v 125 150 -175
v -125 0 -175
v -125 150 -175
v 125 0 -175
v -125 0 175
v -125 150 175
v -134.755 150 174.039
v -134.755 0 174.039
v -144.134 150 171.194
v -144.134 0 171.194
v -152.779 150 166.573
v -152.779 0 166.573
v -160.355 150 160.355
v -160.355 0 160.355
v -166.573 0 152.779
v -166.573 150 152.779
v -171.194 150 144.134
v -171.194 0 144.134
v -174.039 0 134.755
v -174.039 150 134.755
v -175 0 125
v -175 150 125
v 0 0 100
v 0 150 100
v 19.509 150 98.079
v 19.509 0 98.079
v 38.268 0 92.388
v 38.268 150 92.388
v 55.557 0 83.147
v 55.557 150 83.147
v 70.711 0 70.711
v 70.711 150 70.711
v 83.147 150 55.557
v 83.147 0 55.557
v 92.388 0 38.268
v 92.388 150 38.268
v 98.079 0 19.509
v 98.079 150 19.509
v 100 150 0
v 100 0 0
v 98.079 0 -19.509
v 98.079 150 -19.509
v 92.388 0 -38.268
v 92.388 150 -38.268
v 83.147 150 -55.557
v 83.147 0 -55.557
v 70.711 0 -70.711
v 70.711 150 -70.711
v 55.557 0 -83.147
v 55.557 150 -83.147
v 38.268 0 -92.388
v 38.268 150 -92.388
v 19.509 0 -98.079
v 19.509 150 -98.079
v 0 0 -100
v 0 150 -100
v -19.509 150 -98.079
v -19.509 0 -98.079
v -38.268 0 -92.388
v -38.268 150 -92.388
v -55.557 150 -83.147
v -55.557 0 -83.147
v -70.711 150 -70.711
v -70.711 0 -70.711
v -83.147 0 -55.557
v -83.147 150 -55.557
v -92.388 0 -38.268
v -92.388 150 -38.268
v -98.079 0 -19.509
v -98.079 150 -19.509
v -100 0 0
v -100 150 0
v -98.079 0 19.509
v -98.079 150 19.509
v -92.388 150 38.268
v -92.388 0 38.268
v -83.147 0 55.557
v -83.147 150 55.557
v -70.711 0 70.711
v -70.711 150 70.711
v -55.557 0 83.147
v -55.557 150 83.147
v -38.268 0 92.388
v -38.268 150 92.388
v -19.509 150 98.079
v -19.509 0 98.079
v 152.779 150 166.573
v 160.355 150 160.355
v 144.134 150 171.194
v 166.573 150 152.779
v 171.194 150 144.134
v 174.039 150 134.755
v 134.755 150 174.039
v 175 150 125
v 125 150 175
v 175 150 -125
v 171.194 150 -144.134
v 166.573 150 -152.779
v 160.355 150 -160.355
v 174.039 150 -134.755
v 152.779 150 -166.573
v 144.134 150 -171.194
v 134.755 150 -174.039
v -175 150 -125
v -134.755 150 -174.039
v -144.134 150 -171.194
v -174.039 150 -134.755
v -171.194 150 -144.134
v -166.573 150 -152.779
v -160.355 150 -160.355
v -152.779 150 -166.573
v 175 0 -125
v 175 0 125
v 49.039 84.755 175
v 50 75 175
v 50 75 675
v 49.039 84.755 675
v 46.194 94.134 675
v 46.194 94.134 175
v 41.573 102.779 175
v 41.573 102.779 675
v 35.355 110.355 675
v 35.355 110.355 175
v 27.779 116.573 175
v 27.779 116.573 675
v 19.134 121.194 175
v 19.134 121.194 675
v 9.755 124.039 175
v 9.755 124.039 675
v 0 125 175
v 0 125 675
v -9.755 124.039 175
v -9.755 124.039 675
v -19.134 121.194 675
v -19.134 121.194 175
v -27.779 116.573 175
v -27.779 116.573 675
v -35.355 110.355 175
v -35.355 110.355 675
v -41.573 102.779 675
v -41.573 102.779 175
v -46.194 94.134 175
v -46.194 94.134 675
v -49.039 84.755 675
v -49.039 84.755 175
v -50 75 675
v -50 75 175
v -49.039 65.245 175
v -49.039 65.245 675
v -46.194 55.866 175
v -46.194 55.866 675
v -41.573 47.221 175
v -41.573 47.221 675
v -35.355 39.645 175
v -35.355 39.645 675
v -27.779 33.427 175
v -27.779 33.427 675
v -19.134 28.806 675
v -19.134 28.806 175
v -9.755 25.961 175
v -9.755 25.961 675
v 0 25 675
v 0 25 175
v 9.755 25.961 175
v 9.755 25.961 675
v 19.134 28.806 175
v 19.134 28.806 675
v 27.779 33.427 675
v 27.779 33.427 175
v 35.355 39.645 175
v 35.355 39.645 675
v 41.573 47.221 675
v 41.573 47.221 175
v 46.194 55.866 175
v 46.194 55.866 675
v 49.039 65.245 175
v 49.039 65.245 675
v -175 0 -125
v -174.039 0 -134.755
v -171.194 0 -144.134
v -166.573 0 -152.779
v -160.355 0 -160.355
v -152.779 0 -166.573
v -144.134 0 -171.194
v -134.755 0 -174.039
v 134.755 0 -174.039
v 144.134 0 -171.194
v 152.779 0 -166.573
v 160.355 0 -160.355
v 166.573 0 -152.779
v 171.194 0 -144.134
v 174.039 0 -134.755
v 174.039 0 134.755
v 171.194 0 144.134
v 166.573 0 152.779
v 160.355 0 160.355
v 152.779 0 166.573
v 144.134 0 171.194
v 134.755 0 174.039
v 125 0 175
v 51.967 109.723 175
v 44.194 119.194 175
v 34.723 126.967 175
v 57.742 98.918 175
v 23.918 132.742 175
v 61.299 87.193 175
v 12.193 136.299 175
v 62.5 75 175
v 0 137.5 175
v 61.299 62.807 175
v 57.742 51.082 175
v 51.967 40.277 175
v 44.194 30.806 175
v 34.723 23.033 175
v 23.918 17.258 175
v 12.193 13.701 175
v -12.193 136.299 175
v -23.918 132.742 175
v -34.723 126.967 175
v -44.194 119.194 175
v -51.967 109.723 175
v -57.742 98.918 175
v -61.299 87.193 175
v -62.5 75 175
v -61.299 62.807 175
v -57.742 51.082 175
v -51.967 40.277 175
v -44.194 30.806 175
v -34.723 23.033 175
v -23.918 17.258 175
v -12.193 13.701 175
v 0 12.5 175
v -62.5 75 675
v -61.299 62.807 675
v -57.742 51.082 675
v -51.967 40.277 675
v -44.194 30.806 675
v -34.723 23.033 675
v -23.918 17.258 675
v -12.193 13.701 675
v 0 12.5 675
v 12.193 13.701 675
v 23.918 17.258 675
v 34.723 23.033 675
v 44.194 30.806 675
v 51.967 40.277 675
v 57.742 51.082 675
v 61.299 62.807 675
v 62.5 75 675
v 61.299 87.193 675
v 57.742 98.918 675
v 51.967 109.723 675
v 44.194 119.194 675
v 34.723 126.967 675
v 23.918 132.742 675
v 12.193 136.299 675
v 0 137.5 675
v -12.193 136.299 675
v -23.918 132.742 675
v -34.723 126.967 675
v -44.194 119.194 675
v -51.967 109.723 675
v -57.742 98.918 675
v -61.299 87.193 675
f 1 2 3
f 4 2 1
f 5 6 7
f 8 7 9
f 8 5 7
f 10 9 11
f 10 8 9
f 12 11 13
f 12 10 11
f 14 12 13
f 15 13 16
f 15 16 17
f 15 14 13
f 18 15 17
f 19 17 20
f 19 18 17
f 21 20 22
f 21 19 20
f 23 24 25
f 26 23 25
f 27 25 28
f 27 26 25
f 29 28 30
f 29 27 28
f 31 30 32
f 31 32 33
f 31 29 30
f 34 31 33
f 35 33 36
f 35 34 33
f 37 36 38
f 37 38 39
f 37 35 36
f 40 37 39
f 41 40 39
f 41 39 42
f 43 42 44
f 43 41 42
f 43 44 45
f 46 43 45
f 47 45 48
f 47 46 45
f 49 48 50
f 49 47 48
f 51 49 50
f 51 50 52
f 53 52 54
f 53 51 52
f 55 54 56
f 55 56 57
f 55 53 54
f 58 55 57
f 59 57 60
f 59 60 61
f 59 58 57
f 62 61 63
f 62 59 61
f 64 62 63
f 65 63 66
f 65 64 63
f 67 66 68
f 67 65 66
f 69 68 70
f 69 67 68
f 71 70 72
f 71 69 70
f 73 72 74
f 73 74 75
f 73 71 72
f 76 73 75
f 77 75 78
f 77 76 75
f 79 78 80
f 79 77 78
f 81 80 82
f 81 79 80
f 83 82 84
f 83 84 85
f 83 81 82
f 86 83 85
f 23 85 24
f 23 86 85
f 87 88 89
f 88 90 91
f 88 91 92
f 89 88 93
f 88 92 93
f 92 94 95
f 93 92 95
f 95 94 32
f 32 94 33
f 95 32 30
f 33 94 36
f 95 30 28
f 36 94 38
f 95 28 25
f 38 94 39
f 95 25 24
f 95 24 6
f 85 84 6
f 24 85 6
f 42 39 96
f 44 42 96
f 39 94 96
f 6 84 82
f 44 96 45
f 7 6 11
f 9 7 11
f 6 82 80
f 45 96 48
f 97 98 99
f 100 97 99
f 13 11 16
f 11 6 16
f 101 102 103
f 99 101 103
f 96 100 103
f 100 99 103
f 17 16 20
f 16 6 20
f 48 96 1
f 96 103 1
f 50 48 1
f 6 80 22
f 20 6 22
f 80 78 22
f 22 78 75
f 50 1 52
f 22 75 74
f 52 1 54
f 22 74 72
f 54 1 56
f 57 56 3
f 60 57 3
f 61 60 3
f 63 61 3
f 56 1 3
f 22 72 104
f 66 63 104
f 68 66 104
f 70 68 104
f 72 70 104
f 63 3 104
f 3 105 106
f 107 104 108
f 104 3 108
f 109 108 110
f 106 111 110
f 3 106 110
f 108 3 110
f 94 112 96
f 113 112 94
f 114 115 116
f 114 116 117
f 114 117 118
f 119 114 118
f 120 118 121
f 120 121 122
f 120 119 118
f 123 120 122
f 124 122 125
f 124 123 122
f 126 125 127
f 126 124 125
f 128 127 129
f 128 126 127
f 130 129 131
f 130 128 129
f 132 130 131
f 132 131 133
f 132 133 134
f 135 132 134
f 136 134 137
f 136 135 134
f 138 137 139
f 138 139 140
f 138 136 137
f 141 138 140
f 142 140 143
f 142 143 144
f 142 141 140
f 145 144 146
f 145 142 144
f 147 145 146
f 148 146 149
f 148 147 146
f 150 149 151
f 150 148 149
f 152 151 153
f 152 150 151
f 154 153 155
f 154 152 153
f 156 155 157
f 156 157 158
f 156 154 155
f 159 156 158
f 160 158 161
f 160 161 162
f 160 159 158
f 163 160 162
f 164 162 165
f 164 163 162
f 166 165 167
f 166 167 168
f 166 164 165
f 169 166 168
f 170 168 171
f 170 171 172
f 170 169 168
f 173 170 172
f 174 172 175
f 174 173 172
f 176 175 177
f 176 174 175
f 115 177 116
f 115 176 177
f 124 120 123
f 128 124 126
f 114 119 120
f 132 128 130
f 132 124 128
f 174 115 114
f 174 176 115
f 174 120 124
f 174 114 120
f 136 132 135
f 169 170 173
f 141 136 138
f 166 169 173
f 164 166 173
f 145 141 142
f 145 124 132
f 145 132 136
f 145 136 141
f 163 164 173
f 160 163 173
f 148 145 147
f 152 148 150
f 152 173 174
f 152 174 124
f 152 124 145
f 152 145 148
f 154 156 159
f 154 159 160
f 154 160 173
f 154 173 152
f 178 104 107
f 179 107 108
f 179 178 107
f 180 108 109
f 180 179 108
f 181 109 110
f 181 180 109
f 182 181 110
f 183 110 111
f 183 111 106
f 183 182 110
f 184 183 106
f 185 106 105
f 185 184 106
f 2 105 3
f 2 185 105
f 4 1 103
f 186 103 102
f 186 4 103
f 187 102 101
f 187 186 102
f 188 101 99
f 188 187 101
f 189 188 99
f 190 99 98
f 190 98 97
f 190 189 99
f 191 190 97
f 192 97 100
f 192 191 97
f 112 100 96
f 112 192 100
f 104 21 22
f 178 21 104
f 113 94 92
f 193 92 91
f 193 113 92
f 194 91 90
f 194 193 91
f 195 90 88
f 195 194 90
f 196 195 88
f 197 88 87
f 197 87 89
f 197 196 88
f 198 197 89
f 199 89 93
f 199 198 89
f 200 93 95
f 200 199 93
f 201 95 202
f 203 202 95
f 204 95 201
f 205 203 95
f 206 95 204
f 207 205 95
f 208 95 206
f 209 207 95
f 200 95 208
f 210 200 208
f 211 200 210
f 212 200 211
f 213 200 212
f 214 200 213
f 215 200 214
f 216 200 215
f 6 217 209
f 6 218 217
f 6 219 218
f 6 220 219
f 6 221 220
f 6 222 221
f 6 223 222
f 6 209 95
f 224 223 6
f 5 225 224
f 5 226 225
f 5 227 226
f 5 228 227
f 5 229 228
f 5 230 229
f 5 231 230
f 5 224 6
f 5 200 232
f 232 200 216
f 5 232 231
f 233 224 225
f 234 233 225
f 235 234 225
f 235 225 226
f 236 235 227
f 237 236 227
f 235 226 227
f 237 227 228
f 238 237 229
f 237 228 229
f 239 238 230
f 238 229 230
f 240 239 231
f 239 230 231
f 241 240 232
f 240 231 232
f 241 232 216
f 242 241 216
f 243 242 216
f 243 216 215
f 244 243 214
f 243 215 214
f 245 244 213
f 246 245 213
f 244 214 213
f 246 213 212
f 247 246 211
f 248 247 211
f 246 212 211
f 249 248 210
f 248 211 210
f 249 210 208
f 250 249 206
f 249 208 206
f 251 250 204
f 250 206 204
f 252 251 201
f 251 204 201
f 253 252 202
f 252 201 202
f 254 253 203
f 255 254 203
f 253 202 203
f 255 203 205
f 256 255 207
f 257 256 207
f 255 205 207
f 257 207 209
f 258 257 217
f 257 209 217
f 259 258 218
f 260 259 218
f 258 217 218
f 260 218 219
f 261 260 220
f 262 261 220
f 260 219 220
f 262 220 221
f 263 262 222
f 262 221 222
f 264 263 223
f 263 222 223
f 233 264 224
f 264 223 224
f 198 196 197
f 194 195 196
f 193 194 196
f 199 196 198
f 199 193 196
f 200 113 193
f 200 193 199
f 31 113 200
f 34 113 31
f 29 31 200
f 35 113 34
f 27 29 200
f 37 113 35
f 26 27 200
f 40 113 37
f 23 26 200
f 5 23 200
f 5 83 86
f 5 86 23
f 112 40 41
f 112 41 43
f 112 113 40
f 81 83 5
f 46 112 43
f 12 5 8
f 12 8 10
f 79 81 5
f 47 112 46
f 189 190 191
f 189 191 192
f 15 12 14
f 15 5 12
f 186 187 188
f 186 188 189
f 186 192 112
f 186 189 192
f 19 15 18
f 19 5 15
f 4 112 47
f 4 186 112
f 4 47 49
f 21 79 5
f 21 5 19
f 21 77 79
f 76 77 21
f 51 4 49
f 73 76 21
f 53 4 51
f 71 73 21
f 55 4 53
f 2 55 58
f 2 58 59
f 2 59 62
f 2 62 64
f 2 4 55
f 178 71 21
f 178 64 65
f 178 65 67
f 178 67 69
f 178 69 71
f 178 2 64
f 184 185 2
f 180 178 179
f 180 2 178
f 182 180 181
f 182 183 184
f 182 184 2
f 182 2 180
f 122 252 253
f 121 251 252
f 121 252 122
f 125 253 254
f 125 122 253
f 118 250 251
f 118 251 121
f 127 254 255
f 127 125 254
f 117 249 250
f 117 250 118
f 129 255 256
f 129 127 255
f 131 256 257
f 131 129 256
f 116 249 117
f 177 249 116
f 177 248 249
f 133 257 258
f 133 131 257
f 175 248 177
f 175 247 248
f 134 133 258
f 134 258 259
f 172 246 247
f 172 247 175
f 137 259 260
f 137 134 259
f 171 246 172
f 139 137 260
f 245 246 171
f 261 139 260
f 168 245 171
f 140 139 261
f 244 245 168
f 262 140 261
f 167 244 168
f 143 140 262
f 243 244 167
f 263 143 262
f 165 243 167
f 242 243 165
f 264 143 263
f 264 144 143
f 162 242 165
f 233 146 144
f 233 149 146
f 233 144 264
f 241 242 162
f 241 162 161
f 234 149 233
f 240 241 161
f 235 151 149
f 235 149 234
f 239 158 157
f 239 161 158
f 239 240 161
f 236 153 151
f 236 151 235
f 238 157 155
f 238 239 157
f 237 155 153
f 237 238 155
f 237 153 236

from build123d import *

# Parameters (mm, degrees)
SKETCH1_R           = 100
BOSS_EXTRUDE1_DEPTH = 150
SKETCH4_R           = 62.5
SKETCH4_R_2         = 50
BOSS_EXTRUDE3_DEPTH = 500


with BuildPart() as part:
    # Sketch1 → Boss-Extrude1 (new body)
    with BuildSketch(Plane(origin=(0, 0, 0), x_dir=(1, 0, 0), z_dir=(0, 1, 0))):
        with BuildLine():
            Line((-125, 175), (125, 175))
            ThreePointArc((125, 175), (160.355339059, 160.355339059), (175, 125))
            Line((175, 125), (175, -125))
            ThreePointArc((175, -125), (160.355339059, -160.355339059), (125, -175))
            Line((125, -175), (-125, -175))
            ThreePointArc((-125, -175), (-160.355339059, -160.355339059), (-175, -125))
            Line((-175, -125), (-175, 125))
            ThreePointArc((-175, 125), (-160.355339059, 160.355339059), (-125, 175))
        make_face()
        with Locations(Location((0, 0, 0), (0, 0, 270))):
            Circle(SKETCH1_R, mode=Mode.SUBTRACT)
    extrude(amount=BOSS_EXTRUDE1_DEPTH)

    # Sketch4 → Boss-Extrude3 (add)
    with BuildSketch(Plane.XY.offset(175)):
        with Locations(Location((0, 75, 0), (0, 0, 180))):
            Circle(SKETCH4_R)
        with Locations((0, 75)):
            Circle(SKETCH4_R_2, mode=Mode.SUBTRACT)
    extrude(amount=BOSS_EXTRUDE3_DEPTH)


solid = part.part
